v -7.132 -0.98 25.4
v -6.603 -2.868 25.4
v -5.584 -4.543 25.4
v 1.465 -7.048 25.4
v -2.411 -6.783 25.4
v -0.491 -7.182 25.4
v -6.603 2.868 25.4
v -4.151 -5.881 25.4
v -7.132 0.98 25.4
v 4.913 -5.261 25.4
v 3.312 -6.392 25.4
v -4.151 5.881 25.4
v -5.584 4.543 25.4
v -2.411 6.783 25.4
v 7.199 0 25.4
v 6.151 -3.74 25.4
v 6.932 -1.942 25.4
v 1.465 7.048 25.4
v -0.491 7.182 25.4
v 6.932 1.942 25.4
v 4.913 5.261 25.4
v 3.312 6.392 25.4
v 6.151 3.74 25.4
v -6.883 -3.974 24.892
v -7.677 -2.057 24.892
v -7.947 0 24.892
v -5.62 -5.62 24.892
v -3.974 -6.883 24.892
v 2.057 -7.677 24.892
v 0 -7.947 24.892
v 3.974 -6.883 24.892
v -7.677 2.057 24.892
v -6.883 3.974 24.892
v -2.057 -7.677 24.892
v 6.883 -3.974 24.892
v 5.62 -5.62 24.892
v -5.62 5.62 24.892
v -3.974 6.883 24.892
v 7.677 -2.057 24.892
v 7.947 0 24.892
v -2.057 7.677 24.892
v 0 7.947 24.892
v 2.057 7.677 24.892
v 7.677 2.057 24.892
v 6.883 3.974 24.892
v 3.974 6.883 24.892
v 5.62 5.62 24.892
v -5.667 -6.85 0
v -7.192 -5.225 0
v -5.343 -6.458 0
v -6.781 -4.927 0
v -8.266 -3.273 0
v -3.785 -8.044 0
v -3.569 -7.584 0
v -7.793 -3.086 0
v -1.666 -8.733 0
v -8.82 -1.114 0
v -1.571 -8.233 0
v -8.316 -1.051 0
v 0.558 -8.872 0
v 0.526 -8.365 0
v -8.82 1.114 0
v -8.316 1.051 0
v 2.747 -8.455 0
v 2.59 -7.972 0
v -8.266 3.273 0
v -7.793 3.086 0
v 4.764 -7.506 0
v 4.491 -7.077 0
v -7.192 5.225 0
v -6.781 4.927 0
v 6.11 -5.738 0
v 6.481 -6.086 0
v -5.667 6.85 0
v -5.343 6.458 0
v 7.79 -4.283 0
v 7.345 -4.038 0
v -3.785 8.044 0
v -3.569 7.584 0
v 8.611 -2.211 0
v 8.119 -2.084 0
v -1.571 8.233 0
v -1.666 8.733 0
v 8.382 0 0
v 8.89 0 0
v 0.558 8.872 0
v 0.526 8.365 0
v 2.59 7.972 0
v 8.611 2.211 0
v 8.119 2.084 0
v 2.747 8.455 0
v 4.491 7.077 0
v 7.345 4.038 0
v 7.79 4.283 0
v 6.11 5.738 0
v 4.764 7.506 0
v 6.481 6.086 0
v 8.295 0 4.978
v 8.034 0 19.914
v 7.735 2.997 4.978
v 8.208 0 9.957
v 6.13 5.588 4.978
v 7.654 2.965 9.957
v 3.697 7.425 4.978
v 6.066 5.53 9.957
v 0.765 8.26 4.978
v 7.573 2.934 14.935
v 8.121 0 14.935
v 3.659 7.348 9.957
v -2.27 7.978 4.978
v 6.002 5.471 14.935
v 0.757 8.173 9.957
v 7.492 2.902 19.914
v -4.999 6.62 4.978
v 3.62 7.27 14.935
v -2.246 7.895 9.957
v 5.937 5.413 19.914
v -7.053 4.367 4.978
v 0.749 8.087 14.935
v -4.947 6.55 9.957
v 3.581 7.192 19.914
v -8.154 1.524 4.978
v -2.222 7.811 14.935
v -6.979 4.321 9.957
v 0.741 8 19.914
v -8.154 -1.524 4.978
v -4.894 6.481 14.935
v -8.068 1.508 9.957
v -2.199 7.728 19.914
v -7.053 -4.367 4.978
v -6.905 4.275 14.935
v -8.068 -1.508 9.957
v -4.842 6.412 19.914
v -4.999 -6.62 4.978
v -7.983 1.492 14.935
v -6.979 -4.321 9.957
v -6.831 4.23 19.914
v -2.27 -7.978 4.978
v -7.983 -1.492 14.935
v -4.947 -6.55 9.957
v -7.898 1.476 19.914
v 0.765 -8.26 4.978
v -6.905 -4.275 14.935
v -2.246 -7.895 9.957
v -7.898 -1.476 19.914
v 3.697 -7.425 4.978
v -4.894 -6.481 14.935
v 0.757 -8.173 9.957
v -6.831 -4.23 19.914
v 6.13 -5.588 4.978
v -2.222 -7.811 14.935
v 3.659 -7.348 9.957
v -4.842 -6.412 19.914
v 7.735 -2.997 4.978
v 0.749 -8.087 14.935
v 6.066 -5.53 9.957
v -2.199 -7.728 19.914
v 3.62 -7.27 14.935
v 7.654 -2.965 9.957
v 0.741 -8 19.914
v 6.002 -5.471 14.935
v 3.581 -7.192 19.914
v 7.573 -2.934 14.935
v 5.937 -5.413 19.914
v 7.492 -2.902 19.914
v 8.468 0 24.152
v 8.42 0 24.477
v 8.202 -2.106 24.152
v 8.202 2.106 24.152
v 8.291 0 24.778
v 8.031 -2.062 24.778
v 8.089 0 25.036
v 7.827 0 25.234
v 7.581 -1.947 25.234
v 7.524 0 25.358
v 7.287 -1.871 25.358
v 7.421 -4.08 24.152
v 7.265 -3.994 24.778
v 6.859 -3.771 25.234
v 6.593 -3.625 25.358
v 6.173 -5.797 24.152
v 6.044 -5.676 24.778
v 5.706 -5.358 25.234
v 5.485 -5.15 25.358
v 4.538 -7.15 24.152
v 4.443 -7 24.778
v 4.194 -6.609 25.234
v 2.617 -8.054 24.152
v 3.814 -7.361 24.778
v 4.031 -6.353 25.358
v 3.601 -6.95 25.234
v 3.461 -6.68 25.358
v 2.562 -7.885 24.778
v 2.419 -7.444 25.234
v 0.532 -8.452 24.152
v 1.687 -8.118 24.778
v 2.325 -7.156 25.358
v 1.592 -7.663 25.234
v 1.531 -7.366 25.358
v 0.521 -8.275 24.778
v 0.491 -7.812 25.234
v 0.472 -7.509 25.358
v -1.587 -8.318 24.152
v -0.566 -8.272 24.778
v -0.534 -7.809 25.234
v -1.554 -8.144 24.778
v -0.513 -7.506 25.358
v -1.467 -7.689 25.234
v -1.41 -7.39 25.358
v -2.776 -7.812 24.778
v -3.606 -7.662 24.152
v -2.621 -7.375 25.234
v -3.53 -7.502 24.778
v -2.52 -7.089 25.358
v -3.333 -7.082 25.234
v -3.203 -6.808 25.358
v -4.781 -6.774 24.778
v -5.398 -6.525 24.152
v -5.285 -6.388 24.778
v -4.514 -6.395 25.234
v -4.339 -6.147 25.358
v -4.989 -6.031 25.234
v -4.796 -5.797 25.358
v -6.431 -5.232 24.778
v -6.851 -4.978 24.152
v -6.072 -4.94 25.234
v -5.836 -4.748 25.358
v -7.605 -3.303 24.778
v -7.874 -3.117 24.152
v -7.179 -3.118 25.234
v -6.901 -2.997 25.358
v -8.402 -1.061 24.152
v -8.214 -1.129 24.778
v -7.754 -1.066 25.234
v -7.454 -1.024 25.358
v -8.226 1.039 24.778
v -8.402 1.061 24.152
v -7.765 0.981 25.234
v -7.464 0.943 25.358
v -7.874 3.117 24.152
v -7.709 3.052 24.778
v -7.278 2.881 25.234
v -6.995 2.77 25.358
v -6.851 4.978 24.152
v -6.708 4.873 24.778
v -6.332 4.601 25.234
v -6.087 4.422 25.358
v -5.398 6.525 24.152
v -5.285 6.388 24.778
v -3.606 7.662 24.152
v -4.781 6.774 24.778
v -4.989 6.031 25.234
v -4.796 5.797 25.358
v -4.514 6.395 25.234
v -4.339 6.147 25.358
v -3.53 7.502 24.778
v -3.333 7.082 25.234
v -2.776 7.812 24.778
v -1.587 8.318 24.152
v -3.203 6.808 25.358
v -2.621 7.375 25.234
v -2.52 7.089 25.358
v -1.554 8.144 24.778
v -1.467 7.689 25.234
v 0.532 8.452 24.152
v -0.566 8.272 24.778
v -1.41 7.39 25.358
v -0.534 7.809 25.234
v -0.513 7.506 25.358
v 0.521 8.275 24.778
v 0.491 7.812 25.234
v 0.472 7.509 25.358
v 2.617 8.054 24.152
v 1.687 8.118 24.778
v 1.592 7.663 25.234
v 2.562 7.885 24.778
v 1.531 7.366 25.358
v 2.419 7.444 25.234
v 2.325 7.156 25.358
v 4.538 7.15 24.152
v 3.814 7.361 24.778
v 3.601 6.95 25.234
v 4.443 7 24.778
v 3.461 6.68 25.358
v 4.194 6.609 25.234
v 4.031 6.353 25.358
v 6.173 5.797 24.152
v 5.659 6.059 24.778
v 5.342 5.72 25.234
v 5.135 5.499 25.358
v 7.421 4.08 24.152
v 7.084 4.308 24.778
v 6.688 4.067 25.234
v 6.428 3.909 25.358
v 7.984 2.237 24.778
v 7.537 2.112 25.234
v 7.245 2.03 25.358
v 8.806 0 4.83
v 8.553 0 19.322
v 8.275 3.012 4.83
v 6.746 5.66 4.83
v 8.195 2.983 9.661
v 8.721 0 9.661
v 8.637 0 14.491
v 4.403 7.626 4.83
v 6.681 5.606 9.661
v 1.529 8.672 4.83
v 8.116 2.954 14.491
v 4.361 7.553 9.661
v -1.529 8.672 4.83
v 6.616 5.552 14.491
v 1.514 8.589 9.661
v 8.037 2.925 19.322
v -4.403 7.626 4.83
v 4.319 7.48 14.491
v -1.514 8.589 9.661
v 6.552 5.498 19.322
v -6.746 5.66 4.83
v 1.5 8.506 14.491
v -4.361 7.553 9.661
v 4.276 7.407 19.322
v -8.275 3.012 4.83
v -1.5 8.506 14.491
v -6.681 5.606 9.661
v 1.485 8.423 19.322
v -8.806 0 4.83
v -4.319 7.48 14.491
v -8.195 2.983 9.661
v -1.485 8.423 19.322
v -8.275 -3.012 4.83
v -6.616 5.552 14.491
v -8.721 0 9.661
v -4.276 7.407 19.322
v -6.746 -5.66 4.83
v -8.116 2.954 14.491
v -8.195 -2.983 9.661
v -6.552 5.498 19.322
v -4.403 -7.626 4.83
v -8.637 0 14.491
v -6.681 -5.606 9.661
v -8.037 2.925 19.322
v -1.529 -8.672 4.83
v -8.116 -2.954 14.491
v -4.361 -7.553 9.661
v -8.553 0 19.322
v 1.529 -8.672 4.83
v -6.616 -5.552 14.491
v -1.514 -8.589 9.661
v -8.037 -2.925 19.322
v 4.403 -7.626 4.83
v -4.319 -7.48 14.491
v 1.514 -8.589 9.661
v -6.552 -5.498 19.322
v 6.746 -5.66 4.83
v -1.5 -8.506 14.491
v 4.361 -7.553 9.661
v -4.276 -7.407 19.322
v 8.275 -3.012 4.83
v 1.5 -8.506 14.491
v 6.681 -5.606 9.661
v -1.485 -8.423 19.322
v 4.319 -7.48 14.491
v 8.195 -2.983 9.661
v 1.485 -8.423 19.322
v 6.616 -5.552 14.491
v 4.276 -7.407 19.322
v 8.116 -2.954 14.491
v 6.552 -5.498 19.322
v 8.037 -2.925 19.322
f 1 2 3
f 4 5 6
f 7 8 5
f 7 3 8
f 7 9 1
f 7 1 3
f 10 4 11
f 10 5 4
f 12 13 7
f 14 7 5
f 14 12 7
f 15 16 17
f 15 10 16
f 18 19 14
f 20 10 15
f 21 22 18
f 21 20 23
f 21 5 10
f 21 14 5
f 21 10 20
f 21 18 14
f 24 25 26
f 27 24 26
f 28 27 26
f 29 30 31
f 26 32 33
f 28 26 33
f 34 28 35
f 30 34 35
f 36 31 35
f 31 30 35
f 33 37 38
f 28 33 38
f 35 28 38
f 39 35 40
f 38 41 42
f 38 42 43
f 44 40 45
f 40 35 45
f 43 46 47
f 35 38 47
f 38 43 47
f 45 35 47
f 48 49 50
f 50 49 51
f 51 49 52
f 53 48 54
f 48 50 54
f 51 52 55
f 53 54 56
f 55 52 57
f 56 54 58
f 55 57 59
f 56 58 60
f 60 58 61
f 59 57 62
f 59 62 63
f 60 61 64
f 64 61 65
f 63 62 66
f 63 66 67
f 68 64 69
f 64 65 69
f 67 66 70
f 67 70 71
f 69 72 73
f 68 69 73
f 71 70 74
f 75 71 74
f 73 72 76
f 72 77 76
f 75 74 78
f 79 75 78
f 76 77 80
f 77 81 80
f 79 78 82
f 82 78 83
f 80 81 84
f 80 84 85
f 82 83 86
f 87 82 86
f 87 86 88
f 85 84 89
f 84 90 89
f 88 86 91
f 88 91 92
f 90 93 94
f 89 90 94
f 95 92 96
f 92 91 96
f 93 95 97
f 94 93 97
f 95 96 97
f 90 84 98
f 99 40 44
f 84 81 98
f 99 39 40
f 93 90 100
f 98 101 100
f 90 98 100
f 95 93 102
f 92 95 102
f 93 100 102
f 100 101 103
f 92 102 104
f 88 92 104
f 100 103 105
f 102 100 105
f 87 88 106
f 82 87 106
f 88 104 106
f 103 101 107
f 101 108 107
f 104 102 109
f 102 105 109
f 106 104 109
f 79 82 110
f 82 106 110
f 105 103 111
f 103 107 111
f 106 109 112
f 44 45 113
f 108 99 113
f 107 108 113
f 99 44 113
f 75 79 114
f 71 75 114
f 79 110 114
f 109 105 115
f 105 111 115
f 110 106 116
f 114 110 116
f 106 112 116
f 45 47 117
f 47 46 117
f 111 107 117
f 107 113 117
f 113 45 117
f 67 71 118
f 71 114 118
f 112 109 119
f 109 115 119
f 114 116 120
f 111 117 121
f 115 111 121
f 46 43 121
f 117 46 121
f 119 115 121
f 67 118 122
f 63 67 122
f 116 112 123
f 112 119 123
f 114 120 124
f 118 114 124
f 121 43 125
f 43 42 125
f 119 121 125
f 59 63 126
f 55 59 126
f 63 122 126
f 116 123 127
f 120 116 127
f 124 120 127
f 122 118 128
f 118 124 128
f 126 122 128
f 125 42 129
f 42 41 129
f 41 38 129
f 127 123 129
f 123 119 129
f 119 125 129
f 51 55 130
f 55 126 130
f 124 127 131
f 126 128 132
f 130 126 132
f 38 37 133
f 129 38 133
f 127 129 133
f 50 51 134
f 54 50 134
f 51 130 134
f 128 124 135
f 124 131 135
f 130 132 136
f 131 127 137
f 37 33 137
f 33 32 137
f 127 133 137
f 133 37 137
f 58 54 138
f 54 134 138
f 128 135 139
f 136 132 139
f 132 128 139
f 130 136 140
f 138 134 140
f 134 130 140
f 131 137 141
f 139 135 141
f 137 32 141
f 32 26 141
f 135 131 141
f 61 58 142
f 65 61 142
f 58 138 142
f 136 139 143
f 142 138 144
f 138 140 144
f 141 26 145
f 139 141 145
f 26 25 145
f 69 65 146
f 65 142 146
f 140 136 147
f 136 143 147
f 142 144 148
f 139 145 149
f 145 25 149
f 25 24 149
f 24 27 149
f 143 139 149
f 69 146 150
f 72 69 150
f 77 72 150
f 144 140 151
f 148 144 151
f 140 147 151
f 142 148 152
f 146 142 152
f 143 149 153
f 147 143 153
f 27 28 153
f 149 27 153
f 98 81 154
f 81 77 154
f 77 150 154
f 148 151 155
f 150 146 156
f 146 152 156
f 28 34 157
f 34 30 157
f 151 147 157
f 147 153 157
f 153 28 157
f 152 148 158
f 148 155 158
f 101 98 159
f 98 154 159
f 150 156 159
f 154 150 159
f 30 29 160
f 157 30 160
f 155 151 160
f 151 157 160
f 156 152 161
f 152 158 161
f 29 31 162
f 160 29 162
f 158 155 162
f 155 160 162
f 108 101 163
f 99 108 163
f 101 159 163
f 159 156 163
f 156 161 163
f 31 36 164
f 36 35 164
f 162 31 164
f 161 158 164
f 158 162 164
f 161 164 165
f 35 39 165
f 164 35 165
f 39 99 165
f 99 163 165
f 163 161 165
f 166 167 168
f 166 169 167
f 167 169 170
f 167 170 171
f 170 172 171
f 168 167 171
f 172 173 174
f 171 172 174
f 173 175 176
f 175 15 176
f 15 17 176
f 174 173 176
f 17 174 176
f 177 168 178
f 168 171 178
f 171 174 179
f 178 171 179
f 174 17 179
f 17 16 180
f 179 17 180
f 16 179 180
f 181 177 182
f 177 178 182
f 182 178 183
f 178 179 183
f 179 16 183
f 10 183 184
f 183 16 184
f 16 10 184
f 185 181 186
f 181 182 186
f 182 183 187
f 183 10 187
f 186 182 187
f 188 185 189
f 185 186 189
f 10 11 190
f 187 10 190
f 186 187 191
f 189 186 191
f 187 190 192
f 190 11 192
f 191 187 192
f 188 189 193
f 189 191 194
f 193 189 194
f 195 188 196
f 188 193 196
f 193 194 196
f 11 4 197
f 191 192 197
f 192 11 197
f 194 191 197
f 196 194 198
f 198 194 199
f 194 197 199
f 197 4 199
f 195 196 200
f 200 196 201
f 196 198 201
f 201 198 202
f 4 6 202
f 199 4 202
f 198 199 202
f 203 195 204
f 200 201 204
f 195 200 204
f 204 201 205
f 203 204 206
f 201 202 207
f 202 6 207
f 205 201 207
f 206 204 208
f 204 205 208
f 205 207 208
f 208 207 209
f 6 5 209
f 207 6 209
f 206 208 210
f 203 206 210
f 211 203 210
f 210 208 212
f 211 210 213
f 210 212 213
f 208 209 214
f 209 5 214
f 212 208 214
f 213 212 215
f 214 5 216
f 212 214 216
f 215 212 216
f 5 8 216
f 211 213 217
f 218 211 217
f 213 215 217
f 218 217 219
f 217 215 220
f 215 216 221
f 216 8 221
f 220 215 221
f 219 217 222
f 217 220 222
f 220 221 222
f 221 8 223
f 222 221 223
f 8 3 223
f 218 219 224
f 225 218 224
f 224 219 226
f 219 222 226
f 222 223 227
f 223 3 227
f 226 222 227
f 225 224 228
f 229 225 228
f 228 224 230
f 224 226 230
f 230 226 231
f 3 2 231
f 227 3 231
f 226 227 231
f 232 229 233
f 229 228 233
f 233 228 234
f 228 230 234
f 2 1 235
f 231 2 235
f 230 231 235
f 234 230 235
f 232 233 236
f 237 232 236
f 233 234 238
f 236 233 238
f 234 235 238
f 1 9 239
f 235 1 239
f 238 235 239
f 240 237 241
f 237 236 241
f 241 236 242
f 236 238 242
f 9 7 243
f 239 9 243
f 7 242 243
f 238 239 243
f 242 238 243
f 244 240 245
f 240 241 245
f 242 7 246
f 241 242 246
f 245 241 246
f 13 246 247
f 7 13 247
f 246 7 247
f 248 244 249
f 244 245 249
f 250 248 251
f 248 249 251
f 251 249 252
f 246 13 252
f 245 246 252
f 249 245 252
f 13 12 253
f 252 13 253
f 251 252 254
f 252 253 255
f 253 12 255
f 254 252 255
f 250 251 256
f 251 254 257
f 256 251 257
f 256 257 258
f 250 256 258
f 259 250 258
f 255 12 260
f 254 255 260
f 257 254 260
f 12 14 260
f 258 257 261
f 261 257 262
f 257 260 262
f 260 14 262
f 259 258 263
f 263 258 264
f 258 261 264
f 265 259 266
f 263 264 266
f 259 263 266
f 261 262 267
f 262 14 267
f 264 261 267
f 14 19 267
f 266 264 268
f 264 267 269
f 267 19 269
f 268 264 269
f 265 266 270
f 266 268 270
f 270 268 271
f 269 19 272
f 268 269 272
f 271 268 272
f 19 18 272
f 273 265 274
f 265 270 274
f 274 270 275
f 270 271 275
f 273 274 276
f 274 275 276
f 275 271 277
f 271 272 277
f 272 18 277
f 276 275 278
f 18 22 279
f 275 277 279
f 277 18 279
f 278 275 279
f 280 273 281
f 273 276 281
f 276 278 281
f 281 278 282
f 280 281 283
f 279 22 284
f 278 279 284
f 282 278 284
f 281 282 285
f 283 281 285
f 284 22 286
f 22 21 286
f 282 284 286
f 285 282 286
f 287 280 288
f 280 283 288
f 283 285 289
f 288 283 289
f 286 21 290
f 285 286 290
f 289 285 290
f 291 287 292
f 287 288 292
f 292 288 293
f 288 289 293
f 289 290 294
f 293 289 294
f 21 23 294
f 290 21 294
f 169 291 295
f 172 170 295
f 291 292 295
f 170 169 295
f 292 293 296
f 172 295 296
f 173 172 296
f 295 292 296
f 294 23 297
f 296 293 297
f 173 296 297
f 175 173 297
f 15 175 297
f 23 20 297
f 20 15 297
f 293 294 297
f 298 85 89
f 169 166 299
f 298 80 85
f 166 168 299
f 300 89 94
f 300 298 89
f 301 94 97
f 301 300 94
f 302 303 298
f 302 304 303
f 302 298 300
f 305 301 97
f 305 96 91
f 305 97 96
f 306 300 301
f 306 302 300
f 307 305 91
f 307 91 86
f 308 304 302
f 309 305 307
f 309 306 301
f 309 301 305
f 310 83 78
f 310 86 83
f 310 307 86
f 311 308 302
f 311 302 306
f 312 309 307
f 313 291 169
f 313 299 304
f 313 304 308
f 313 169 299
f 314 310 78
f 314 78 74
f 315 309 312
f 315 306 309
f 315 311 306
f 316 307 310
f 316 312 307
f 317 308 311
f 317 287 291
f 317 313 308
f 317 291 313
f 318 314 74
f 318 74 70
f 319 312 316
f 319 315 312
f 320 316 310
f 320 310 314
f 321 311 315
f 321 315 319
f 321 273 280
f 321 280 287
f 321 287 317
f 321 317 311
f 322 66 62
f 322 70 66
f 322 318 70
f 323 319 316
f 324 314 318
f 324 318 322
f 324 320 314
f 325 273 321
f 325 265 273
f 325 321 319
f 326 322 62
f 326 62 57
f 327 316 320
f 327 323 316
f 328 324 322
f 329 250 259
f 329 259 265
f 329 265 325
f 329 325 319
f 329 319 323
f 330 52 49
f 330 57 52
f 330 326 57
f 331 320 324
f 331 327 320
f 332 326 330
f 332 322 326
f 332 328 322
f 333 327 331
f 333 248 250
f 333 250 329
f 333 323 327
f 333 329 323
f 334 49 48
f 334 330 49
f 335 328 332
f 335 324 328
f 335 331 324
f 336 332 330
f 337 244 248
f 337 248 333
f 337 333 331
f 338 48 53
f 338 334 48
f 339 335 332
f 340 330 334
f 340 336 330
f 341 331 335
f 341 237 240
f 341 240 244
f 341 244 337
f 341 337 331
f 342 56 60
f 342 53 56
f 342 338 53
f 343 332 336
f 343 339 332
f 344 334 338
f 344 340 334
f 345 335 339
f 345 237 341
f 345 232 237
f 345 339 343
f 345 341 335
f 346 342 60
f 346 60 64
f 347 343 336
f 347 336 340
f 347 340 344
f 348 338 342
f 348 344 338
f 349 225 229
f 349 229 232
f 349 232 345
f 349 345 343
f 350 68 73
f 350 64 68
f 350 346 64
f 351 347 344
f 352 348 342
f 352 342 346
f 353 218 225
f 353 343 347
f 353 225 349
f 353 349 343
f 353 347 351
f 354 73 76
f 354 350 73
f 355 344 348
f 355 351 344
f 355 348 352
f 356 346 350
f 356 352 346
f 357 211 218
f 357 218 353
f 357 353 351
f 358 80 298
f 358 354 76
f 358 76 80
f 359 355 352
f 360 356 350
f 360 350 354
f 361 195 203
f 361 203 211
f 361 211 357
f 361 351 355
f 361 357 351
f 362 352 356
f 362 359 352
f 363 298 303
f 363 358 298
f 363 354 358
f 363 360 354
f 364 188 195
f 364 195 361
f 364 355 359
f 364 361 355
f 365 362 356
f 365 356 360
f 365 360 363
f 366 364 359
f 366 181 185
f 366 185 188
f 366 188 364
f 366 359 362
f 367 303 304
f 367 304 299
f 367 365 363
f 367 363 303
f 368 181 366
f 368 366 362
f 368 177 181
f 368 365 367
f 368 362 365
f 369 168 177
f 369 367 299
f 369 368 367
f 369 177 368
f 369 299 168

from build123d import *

# Parameters (mm, degrees)
F0_R     = 8.89
F1_DEPTH = 25.4
F1_TAPER = 1
F2_T     = -0.508
F3_R     = 1.27


with BuildPart() as f1:
    # F0 (on Top) → F1 (new body)
    with BuildSketch(Plane.XY):
        Circle(F0_R)
    extrude(amount=F1_DEPTH, taper=F1_TAPER)

    # F2
    f2_openings = [f1.faces().sort_by_distance(p)[0] for p in [
        (0, 0, 0),
    ]]
    offset(amount=F2_T, openings=f2_openings)

    # F3
    f3_edges = [f1.edges().sort_by_distance(p)[0] for p in [
        (-8.446641, 0, 25.4),
    ]]
    fillet(f3_edges, radius=F3_R)


solid = f1.part
